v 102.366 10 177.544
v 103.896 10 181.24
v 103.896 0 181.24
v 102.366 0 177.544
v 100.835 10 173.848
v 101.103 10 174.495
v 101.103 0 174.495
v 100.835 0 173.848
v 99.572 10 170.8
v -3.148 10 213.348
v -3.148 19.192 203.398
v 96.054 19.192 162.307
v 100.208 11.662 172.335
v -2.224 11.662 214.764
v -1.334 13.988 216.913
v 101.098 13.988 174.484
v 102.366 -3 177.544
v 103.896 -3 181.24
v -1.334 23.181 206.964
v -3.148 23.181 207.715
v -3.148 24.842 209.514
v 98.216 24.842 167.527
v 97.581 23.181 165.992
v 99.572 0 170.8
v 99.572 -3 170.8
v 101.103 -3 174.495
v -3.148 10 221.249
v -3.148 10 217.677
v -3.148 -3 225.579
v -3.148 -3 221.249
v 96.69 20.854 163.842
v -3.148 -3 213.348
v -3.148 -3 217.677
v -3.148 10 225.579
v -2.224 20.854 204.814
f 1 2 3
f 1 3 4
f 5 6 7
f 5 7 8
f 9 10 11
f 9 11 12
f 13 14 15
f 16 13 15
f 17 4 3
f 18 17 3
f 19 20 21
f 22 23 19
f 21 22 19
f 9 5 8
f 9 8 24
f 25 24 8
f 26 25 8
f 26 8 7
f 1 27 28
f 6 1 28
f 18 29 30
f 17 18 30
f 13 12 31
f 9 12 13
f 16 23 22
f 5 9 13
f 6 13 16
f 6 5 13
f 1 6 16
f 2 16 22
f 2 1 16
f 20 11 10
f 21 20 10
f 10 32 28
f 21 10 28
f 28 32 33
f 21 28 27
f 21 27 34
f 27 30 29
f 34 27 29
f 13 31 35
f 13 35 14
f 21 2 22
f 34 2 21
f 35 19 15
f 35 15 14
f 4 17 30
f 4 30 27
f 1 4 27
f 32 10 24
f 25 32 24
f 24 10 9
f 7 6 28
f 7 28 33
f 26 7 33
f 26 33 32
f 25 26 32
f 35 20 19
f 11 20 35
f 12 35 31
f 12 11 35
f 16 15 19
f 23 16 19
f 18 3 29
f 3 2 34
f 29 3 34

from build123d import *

# Parameters (mm, degrees)
SKETCH1_W           = 214.089522673
SKETCH1_H           = 271.033566845
BOSS_EXTRUDE1_DEPTH = 10
SKETCH3_W           = 107.044761337
SKETCH3_H           = 271.033566845
CUT_EXTRUDE1_DEPTH  = 252.253590179
CUT_EXTRUDE2_DEPTH  = 249.55642867
BOSS_EXTRUDE3_DEPTH = 40
CUT_EXTRUDE3_START  = -165.689856025
CUT_EXTRUDE3_DEPTH  = 205.862728092
CUT_EXTRUDE4_DEPTH  = 250.960593361
CUT_EXTRUDE5_DEPTH  = 250.960593361
BOSS_EXTRUDE5_DEPTH = 45
CUT_EXTRUDE7_DEPTH  = 253.784190336
CUT_EXTRUDE9_DEPTH  = 253.784190336
CUT_EXTRUDE10_DEPTH = 253.784190336
BOSS_EXTRUDE6_DEPTH = 13.546139965


with BuildPart() as part:
    # Sketch1 → Boss-Extrude1 (new body)
    with BuildSketch(Plane(origin=(0, 0, 0), x_dir=(1, 0, 0), z_dir=(0, 1, 0))):
        with Locations((-3.148375333, -90.062114546)):
            Rectangle(SKETCH1_W, SKETCH1_H)
    extrude(amount=BOSS_EXTRUDE1_DEPTH)

    # Sketch3 → Cut-Extrude1 (cut, through all)
    with BuildSketch(Plane(origin=(0, 10, 0), x_dir=(1, 0, 0), z_dir=(0, 1, 0))):
        with Locations((-56.670756002, -90.062114546)):
            Rectangle(SKETCH3_W, SKETCH3_H)
    extrude(amount=-CUT_EXTRUDE1_DEPTH, mode=Mode.SUBTRACT)

    # Sketch4 → Cut-Extrude2 (cut, through all)
    with BuildSketch(Plane(origin=(0, 10, 0), x_dir=(1, 0, 0), z_dir=(0, 1, 0))):
        Polygon((103.896386003, -181.239506042), (100.834918545, -173.848469781), (9.996584241, 45.454668877), (103.896386003, 45.454668877), align=None)
    extrude(amount=-CUT_EXTRUDE2_DEPTH, mode=Mode.SUBTRACT)

    # Sketch6 → Boss-Extrude3 (add, along a direction that is not the sketch's normal)
    with BuildSketch(Plane(origin=(0, 10, 0), x_dir=(1, 0, 0), z_dir=(0, 1, 0))):
        Polygon((99.572063218, -170.799667324), (103.896386003, -181.239506042), (-3.148375333, -225.578897968), (-3.148375333, -213.347866105), align=None)
    extrude(amount=BOSS_EXTRUDE3_DEPTH, dir=(-0.2705980500730979, 0.7071067811865489, -0.6532814824381872))

    # Cut-Extrude3: read off the stored shape, not the designer's step
    # Cut-Extrude3 outline → Cut-Extrude3 (cut)
    with BuildSketch(Plane(origin=(0, 0, 0), x_dir=(1, 0, 0), z_dir=(0, 0.6785983445458481, -0.7345095552677544)).offset(CUT_EXTRUDE3_START)):
        Polygon((-3.148375333, -165), (-3.148375333, -152.122604304), (-13.972297336, -155.165042499), (-15, -155.45391393), (-15, -165), align=None)
    extrude(amount=CUT_EXTRUDE3_DEPTH, mode=Mode.SUBTRACT)

    # Sketch8 → Cut-Extrude4 (cut, through all)
    with BuildSketch(Plane(origin=(0, 10, 0), x_dir=(1, 0, 0), z_dir=(0, 1, 0))):
        Polygon((-3.148375333, -225.578897968), (103.896386003, -181.239506042), (103.896386003, -225.578897968), align=None)
    extrude(amount=-CUT_EXTRUDE4_DEPTH, mode=Mode.SUBTRACT)

    # Sketch9 → Cut-Extrude5 (cut, through all)
    with BuildSketch(Plane(origin=(0, 10, 0), x_dir=(1, 0, 0), z_dir=(0, 1, 0))):
        Polygon((-3.148375333, -213.347866105), (99.572063218, -170.799667324), (9.996584241, 45.454668877), (-3.148375333, 45.454668877), align=None)
    extrude(amount=-CUT_EXTRUDE5_DEPTH, mode=Mode.SUBTRACT)

    # Sketch13 → Boss-Extrude5 (add)
    with BuildSketch(Plane.XZ):
        Polygon((-3.148375333, 225.578897968), (-3.148375333, 213.347866105), (99.572063218, 170.799667324), (103.896386003, 181.239506042), align=None)
    extrude(amount=BOSS_EXTRUDE5_DEPTH)

    # Sketch14 → Cut-Extrude7 (cut, through all)
    with BuildSketch(Plane(origin=(24.603270673, 0, -10.191008392), x_dir=(-0.38268343236508967, 0, -0.9238795325112868), z_dir=(0.9238795325112867, 0, -0.3826834323650896))):
        Polygon((-178.918624473, 38.284271247), (-173.268624473, 32.634271247), (-167.618624473, 38.284271247), align=None)
    extrude(amount=-CUT_EXTRUDE7_DEPTH, mode=Mode.SUBTRACT)

    # Sketch21 → Cut-Extrude9 (cut, through all)
    with BuildSketch(Plane(origin=(24.603270673, 0, -10.191008392), x_dir=(-0.38268343236508967, 0, -0.9238795325112868), z_dir=(0.9238795325112867, 0, -0.3826834323650896))):
        Polygon((-178.918624473, 38.284271247), (-173.268624473, 32.634271247), (-186.710507565, 19.192388155), (-188.372208501, 20.854089091), (-197.564596656, 11.661700936), (-199.891194785, 13.988299064), (-190.698806629, 23.18068722), (-192.360507565, 24.842388155), align=None)
    extrude(amount=-CUT_EXTRUDE9_DEPTH, mode=Mode.SUBTRACT)

    # Sketch23 → Cut-Extrude10 (cut, through all)
    with BuildSketch(Plane(origin=(24.603270673, 0, -10.191008392), x_dir=(-0.38268343236508967, 0, -0.9238795325112868), z_dir=(0.9238795325112867, 0, -0.3826834323650896))):
        Polygon((-207.20289572, -3), (-203.20289572, -3), (-203.20289572, 10), (-199.90289572, 10), (-199.90289572, -3), (-195.90289572, -3), (-195.90289572, -45), (-207.20289572, -45), align=None)
    extrude(amount=-CUT_EXTRUDE10_DEPTH, mode=Mode.SUBTRACT)

    # Sketch24 → Boss-Extrude6 (add, along a direction that is not the sketch's normal)
    with BuildSketch(Plane(origin=(35.57097911, -92.95144786, 85.875940195), x_dir=(0.9626924198811571, 0.19875685341551327, -0.18362738881693624), z_dir=(-0.2705980500730966, 0.7071067811865525, -0.6532814824381838))):
        Polygon((-40.219860097, -165.940754997), (-40.219860097, -169.369289928), (-38.335322468, -168.817321636), (-39.260177115, -165.659670359), align=None)
    extrude(amount=BOSS_EXTRUDE6_DEPTH, dir=(0, 0.6785983445458494, -0.7345095552677533))


solid = part.part
